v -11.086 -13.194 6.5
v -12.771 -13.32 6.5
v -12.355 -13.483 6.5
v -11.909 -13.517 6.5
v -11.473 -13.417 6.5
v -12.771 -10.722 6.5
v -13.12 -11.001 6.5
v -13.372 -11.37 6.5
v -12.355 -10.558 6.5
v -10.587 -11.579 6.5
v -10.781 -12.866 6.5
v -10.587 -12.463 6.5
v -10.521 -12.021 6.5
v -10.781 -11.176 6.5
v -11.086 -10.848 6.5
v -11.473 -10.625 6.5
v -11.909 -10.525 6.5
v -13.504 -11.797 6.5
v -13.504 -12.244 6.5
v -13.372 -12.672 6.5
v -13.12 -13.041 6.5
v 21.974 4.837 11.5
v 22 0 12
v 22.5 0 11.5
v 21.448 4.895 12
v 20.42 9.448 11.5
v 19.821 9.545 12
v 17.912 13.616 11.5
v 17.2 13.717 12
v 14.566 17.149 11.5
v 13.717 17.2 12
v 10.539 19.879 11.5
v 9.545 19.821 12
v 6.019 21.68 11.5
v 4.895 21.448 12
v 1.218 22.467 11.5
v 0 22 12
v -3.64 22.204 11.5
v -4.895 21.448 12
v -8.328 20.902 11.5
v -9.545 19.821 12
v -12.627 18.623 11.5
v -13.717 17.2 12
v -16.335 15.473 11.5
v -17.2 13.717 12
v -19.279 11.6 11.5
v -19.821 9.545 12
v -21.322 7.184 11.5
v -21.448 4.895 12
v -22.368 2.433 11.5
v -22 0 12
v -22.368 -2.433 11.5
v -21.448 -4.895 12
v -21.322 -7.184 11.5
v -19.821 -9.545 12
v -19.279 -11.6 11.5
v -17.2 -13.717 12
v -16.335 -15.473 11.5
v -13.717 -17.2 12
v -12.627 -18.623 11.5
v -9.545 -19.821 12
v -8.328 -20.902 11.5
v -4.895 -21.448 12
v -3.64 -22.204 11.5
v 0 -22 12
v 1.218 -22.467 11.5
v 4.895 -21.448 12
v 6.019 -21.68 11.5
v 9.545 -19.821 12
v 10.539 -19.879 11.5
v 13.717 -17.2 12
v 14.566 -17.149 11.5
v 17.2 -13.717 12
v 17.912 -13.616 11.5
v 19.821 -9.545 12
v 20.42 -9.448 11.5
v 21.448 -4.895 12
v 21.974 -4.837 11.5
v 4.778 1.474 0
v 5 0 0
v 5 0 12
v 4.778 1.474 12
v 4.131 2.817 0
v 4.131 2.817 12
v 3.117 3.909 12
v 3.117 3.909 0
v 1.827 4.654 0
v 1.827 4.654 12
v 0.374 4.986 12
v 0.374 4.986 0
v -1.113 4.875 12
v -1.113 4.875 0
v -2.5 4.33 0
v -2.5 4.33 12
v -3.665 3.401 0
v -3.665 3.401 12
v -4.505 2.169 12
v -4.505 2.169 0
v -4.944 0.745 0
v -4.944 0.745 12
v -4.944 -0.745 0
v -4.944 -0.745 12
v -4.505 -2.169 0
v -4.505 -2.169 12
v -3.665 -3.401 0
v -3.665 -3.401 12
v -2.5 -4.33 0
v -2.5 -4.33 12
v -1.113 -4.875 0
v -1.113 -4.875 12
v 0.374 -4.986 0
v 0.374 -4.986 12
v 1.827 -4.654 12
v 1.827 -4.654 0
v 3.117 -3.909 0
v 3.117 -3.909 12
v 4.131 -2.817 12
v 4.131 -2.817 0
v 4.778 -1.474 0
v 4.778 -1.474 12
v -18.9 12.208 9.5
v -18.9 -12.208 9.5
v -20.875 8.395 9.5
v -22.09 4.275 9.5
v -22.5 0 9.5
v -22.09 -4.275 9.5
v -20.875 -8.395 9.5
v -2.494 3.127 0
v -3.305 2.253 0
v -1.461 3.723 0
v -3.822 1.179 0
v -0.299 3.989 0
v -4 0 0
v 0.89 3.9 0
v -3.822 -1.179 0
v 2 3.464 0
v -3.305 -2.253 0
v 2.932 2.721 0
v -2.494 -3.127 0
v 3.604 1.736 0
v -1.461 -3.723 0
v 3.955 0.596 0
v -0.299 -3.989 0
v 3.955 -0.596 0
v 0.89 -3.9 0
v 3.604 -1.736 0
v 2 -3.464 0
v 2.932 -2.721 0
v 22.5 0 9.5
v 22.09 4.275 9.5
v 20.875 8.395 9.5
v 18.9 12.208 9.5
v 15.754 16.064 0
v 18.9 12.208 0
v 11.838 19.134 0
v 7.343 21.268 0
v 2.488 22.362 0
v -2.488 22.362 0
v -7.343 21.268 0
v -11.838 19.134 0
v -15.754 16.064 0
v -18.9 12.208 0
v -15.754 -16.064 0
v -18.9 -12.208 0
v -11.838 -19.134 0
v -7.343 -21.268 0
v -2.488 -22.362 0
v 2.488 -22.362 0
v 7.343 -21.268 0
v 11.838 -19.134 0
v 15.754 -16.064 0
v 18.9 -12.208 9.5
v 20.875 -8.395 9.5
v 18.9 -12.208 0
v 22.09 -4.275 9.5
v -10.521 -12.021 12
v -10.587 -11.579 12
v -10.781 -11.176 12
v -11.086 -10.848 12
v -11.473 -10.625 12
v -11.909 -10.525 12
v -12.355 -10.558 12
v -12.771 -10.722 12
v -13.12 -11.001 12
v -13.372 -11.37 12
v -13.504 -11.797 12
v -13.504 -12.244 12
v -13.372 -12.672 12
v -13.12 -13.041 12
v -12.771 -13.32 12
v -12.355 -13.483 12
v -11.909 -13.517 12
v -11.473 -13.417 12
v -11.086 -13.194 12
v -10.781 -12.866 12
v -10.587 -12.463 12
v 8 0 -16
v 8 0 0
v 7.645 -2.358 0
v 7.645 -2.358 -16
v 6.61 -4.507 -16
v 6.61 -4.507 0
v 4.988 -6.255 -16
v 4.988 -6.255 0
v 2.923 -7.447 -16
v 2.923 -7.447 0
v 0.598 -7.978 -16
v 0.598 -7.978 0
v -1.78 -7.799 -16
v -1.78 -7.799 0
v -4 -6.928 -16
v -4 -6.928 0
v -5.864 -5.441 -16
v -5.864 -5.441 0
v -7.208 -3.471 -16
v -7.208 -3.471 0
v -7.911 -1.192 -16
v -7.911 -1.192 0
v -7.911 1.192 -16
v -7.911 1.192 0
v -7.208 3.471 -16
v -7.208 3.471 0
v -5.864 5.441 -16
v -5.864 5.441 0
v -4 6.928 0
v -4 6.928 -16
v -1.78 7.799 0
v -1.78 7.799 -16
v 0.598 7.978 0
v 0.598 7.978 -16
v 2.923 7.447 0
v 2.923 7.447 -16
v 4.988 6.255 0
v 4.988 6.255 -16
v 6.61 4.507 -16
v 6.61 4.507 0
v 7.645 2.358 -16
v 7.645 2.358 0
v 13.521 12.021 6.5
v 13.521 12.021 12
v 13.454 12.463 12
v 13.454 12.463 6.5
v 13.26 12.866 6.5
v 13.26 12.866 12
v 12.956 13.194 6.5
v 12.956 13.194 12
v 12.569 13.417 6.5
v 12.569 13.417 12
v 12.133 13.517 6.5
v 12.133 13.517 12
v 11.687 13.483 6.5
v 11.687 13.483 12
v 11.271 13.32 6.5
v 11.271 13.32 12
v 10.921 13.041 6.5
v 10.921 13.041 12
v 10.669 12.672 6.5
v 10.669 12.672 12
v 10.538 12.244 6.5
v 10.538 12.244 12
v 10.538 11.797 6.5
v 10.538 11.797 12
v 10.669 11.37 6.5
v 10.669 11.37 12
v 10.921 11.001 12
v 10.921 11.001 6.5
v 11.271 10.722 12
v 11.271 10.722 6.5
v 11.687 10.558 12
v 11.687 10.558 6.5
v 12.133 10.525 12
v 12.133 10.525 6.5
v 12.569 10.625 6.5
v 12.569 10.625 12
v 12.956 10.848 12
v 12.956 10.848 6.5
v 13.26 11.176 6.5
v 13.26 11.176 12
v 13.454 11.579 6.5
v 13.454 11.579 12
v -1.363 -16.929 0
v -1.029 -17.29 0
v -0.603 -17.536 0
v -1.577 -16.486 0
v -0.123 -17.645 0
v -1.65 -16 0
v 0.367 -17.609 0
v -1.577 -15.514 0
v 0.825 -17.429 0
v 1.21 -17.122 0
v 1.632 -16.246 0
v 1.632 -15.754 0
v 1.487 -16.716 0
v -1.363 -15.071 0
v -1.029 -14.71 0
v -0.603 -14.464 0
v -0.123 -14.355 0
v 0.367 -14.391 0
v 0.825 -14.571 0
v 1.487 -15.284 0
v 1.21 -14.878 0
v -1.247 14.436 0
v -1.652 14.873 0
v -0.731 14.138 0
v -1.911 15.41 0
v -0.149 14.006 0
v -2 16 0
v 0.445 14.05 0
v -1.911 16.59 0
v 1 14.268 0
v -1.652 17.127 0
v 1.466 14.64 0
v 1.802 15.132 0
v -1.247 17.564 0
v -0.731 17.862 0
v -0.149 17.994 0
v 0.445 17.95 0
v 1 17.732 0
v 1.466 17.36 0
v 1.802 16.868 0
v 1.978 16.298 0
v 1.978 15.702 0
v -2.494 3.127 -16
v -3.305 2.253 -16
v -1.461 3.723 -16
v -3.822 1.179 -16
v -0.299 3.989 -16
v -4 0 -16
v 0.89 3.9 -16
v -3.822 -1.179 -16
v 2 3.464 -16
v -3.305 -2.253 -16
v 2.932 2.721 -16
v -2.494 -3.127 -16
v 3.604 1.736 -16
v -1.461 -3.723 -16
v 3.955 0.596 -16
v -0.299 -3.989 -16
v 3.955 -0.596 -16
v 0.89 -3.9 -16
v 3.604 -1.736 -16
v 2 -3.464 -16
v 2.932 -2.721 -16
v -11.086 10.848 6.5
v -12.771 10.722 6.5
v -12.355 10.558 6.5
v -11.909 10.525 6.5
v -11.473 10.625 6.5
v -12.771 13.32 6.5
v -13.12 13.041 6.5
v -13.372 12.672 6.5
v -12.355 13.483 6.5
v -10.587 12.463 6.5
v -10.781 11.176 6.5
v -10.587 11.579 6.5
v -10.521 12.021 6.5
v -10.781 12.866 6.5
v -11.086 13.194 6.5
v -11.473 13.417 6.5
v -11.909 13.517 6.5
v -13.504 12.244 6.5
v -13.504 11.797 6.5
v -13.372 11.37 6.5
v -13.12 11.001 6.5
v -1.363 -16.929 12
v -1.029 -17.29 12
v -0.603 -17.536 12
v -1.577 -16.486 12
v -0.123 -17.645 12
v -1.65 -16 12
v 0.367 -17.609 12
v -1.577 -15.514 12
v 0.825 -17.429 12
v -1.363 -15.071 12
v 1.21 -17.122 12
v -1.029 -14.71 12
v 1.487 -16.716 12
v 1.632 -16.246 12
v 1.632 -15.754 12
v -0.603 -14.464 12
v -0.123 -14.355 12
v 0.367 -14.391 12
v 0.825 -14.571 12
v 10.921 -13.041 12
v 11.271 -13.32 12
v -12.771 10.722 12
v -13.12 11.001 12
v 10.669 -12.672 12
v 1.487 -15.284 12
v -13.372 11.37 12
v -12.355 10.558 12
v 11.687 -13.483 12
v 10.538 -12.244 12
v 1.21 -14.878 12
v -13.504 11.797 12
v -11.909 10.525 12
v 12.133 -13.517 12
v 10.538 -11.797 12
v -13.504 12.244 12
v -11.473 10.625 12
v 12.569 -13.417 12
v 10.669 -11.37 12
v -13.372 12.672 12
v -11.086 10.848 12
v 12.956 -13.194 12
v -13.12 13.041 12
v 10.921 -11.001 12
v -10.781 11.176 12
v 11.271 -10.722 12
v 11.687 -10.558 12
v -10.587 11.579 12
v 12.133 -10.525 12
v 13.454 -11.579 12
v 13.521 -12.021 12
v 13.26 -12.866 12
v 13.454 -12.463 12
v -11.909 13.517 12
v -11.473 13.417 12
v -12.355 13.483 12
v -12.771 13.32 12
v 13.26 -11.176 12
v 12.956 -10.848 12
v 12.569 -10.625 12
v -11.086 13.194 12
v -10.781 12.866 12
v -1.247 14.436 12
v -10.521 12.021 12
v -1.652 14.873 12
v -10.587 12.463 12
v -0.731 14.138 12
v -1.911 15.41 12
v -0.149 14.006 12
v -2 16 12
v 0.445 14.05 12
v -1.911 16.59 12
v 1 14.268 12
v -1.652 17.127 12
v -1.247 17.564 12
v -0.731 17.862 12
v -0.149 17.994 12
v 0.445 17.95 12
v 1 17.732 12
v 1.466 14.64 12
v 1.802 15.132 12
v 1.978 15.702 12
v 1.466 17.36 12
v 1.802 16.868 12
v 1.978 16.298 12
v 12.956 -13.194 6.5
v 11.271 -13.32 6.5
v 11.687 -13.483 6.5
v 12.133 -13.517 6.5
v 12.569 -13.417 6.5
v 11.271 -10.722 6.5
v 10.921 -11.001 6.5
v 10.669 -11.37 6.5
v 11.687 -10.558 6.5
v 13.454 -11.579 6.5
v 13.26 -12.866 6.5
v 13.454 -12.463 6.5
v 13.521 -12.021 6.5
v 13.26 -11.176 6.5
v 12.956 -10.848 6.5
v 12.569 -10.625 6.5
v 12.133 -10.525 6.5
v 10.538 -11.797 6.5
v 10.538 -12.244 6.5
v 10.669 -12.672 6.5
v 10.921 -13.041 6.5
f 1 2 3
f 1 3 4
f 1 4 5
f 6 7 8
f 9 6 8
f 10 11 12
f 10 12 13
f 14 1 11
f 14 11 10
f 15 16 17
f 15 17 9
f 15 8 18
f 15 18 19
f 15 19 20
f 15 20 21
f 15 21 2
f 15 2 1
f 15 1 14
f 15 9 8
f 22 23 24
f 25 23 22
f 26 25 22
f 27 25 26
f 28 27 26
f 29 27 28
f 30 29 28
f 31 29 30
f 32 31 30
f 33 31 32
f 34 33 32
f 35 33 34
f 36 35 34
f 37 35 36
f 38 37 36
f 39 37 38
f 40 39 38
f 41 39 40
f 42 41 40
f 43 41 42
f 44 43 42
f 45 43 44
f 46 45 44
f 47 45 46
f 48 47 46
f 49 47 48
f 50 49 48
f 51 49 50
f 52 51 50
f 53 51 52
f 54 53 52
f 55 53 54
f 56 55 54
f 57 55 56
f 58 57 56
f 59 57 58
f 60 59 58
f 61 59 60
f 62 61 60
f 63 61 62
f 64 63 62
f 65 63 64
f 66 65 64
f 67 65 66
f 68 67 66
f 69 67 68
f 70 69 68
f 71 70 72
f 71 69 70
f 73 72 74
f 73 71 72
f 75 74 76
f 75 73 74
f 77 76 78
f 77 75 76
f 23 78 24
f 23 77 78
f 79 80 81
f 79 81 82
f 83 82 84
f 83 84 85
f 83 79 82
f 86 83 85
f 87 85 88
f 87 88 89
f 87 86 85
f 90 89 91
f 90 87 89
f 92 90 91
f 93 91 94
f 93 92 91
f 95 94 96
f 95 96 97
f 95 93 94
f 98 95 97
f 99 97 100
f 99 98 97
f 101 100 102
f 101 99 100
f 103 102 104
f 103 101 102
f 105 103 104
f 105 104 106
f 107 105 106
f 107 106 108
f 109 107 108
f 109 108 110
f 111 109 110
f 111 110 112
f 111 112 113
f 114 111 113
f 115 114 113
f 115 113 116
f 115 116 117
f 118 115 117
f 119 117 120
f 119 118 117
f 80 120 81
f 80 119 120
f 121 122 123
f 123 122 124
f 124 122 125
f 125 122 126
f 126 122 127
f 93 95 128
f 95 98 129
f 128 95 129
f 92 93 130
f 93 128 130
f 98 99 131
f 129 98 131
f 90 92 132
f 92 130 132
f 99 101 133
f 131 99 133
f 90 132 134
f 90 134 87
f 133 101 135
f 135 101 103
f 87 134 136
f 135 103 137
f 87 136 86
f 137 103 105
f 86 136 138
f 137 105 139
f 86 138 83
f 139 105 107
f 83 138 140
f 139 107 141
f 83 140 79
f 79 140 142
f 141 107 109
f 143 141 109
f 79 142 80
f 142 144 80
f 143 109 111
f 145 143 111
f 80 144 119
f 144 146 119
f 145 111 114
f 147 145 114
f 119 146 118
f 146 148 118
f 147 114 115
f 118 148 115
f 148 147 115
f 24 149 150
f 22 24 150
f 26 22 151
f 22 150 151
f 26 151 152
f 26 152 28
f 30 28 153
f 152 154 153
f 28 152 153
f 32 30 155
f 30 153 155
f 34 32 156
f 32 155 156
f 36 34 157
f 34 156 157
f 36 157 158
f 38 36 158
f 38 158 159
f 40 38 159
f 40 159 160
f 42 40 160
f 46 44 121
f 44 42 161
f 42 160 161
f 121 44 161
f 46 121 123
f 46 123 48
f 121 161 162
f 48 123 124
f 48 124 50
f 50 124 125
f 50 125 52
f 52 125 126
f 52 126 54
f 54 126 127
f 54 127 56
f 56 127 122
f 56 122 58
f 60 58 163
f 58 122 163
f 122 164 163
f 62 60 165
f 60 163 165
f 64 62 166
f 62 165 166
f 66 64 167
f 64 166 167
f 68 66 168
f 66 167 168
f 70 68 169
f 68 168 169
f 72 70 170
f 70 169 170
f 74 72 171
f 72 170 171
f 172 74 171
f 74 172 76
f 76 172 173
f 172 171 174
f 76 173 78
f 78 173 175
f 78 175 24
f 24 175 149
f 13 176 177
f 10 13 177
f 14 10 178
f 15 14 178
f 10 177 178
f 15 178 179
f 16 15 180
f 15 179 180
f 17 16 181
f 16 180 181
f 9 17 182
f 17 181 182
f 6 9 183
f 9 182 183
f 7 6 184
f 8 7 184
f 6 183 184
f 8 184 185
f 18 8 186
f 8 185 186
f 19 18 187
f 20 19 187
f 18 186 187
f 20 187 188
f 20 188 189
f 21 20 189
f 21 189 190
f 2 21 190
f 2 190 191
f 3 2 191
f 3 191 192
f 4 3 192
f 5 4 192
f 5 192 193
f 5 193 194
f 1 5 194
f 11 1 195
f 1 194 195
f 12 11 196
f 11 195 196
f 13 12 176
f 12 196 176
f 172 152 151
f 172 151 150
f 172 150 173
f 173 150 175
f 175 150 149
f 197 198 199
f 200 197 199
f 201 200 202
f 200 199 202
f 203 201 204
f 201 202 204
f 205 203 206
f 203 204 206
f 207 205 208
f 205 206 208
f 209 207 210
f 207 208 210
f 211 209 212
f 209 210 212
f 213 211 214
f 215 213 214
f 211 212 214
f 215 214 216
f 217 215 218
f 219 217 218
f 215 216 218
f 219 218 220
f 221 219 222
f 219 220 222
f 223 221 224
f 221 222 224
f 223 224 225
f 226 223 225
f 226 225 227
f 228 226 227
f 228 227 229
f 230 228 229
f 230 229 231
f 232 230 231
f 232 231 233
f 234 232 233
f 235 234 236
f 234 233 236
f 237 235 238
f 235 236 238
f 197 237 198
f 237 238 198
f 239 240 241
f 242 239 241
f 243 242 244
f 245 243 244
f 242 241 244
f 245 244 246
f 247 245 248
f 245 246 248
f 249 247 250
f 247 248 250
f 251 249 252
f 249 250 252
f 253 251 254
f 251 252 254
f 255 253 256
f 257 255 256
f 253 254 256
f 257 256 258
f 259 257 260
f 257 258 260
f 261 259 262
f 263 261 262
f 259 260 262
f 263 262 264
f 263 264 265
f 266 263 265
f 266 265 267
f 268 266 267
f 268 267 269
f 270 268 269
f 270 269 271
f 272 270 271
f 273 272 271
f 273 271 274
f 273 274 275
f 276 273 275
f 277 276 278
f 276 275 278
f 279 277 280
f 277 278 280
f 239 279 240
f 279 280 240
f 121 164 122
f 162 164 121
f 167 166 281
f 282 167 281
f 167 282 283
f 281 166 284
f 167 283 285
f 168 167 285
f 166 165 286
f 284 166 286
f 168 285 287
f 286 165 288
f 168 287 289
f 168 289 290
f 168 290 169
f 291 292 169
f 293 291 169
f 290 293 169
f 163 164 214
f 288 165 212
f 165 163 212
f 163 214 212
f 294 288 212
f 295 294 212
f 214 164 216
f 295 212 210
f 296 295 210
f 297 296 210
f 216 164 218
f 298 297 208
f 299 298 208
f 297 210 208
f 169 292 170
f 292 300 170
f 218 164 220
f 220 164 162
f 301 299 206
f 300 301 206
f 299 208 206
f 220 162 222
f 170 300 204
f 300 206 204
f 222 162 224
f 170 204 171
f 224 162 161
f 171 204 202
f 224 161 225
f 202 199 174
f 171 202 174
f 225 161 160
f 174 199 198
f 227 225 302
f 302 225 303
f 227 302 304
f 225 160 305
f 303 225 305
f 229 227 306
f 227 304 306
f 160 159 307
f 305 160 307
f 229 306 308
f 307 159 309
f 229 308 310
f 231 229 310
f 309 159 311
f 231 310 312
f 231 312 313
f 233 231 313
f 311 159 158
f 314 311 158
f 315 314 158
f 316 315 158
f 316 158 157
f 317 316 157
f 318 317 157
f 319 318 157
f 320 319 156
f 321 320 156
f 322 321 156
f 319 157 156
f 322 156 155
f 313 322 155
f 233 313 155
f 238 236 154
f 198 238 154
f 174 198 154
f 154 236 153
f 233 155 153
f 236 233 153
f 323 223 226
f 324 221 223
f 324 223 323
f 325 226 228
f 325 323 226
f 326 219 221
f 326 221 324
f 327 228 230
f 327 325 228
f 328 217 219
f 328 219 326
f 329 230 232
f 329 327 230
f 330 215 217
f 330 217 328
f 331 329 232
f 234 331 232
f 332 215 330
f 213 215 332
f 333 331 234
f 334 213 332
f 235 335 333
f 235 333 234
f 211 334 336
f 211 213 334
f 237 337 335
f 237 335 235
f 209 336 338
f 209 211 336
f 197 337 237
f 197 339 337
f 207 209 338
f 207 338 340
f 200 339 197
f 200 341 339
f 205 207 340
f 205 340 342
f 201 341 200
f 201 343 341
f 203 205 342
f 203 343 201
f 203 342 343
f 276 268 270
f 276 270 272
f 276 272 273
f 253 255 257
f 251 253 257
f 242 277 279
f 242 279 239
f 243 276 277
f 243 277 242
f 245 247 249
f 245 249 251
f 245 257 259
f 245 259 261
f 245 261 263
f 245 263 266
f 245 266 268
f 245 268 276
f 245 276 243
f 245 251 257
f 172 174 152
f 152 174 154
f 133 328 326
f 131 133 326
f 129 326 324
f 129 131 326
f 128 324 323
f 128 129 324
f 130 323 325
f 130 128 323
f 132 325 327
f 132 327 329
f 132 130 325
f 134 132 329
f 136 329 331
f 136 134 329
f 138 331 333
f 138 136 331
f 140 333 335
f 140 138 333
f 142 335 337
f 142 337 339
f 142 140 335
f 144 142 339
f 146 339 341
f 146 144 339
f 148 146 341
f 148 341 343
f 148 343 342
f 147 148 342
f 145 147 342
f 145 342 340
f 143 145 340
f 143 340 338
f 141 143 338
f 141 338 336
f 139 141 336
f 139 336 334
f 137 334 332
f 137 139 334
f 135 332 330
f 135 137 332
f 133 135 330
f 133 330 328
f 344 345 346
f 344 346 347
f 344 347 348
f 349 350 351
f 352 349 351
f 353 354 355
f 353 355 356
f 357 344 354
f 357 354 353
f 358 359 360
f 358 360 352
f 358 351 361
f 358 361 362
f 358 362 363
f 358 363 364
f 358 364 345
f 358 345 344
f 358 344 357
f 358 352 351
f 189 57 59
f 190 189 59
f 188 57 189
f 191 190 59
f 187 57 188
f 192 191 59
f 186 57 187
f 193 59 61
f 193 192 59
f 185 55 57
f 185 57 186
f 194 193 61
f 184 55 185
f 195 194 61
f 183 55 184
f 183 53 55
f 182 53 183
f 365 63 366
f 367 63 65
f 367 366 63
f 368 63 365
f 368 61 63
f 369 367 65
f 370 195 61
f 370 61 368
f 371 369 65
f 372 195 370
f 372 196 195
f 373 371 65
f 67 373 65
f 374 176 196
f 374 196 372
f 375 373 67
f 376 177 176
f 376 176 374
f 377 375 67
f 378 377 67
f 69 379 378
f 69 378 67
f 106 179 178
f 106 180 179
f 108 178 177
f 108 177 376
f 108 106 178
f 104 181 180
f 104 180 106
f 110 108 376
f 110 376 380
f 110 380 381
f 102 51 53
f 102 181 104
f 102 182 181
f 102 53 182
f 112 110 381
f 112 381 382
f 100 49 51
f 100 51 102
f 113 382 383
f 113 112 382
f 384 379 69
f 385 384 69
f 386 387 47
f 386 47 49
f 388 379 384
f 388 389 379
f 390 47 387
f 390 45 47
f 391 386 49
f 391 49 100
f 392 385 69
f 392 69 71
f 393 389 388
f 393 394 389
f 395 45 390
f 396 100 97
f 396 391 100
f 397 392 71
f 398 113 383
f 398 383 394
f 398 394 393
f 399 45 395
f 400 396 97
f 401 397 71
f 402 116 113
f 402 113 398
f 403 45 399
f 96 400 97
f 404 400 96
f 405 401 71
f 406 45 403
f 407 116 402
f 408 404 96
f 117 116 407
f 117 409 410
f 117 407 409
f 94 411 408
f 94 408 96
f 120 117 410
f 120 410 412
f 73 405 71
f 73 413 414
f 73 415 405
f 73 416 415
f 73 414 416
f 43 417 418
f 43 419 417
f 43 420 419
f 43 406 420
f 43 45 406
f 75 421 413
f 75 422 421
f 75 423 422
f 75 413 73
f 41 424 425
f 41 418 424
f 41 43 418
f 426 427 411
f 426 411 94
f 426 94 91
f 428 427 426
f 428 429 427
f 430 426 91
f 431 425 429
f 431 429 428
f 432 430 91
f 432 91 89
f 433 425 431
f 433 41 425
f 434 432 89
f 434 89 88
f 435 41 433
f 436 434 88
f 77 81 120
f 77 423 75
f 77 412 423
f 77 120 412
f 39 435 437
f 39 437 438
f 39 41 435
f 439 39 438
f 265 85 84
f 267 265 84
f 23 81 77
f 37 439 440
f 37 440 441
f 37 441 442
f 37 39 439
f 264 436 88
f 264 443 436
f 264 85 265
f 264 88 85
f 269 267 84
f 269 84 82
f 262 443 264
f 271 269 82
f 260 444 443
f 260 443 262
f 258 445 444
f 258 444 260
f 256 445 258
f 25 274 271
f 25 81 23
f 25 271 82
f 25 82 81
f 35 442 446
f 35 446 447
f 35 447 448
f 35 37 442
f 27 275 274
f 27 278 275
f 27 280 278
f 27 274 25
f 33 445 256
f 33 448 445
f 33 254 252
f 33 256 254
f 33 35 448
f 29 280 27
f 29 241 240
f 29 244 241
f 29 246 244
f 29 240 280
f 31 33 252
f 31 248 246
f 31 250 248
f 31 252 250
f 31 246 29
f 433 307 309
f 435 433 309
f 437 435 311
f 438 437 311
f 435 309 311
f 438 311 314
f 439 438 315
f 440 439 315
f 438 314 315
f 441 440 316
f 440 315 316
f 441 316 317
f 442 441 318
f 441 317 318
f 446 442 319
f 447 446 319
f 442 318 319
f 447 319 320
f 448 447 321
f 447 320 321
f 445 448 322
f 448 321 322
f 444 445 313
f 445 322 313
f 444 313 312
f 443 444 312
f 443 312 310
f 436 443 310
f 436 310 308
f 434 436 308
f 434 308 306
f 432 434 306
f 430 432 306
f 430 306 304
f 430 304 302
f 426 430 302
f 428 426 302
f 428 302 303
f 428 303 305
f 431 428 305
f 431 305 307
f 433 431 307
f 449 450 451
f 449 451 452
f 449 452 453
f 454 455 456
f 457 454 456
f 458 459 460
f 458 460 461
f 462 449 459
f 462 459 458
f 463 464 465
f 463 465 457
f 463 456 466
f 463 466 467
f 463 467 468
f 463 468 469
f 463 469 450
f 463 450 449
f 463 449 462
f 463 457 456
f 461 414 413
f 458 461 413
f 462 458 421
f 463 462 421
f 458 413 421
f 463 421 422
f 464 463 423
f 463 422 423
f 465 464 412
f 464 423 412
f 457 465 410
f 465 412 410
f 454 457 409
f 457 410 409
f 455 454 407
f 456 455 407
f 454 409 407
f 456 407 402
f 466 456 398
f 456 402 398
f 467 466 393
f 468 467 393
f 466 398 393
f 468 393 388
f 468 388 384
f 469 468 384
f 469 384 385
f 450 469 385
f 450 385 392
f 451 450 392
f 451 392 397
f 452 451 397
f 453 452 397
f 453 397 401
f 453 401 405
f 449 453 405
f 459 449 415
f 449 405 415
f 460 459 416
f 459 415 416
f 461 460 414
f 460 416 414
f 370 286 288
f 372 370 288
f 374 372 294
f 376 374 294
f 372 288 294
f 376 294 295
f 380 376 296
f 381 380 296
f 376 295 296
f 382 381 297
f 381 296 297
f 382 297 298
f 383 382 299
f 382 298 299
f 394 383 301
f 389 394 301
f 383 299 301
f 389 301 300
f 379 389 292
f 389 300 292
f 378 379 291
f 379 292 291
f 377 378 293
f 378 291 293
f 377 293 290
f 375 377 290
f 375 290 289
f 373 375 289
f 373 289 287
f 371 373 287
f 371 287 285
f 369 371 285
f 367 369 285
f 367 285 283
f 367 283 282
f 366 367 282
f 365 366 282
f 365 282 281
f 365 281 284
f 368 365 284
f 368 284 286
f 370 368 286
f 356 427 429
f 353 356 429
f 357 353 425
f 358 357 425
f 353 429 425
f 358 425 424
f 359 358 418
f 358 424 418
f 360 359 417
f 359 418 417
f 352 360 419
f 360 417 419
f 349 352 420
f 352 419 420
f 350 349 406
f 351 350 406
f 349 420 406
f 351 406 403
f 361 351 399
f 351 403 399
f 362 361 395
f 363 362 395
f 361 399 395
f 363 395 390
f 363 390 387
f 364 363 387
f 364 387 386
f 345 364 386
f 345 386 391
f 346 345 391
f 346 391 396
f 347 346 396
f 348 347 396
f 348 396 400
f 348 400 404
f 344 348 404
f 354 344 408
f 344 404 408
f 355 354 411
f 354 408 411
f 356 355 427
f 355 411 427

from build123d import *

# Parameters (mm, degrees)
SKETCH_1_R           = 22.5
SKETCH_1_R_2         = 5
EXTRUDE_1_DEPTH      = 12
SKETCH_2_R           = 1.5
CUT_EXTRUDE_1_DEPTH  = 5.5
CHAMFER_1_SIZE       = 0.5
SKETCH_3_OUTSIDE_W   = 59.952
SKETCH_3_OUTSIDE_H   = 59.952
SKETCH_3_OUTSIDE_W_2 = 37.8
SKETCH_3_OUTSIDE_H_2 = 50
CUT_EXTRUDE_2_DEPTH  = 9.5
SKETCH_4_R           = 8
SKETCH_4_R_2         = 4
EXTRUDE_2_DEPTH      = 16
SKETCH_5_R           = 2
SKETCH_5_R_2         = 1.65
CUT_EXTRUDE_3_DEPTH  = 16.5


with BuildPart() as part:
    # 草图1 → 凸台-拉伸1 (new body)
    with BuildSketch(Plane.XY):
        Circle(SKETCH_1_R)
        Circle(SKETCH_1_R_2, mode=Mode.SUBTRACT)
    extrude(amount=EXTRUDE_1_DEPTH)

    # 草图2 → 切除-拉伸1 (cut)
    with BuildSketch(Plane.XY.offset(12)):
        with Locations((12.02081528, 12.02081528)):
            Circle(SKETCH_2_R)
        with Locations((12.02081528, -12.02081528)):
            Circle(SKETCH_2_R)
        with Locations((-12.02081528, -12.02081528)):
            Circle(SKETCH_2_R)
        with Locations((-12.02081528, 12.02081528)):
            Circle(SKETCH_2_R)
    extrude(amount=-CUT_EXTRUDE_1_DEPTH, mode=Mode.SUBTRACT)

    # 倒角1
    chamfer_1_edges = [part.edges().sort_by_distance(p)[0] for p in [
        (-22.5, 0, 12),
    ]]
    chamfer(chamfer_1_edges, length=CHAMFER_1_SIZE)

    # 草图3 outside → 切除-拉伸2 (cut)
    with BuildSketch(Plane(origin=(0, 0, 0), x_dir=(-1, 0, 0), z_dir=(0, 0, -1))):
        Rectangle(SKETCH_3_OUTSIDE_W, SKETCH_3_OUTSIDE_H)
        Rectangle(SKETCH_3_OUTSIDE_W_2, SKETCH_3_OUTSIDE_H_2, mode=Mode.SUBTRACT)
    extrude(amount=-CUT_EXTRUDE_2_DEPTH, mode=Mode.SUBTRACT)

    # 草图4 → 凸台-拉伸2 (add)
    with BuildSketch(Plane(origin=(0, 0, 0), x_dir=(-1, 0, 0), z_dir=(0, 0, -1))):
        with Locations(Location((0, 0, 0), (0, 0, 180))):
            Circle(SKETCH_4_R)
        Circle(SKETCH_4_R_2, mode=Mode.SUBTRACT)
    extrude(amount=EXTRUDE_2_DEPTH)

    # 草图5 → 切除-拉伸3 (cut)
    with BuildSketch(Plane(origin=(0, 0, 0), x_dir=(-1, 0, 0), z_dir=(0, 0, -1))):
        with Locations((0, 16)):
            Circle(SKETCH_5_R)
        with Locations((0, -16)):
            Circle(SKETCH_5_R_2)
    extrude(amount=-CUT_EXTRUDE_3_DEPTH, mode=Mode.SUBTRACT)


solid = part.part
